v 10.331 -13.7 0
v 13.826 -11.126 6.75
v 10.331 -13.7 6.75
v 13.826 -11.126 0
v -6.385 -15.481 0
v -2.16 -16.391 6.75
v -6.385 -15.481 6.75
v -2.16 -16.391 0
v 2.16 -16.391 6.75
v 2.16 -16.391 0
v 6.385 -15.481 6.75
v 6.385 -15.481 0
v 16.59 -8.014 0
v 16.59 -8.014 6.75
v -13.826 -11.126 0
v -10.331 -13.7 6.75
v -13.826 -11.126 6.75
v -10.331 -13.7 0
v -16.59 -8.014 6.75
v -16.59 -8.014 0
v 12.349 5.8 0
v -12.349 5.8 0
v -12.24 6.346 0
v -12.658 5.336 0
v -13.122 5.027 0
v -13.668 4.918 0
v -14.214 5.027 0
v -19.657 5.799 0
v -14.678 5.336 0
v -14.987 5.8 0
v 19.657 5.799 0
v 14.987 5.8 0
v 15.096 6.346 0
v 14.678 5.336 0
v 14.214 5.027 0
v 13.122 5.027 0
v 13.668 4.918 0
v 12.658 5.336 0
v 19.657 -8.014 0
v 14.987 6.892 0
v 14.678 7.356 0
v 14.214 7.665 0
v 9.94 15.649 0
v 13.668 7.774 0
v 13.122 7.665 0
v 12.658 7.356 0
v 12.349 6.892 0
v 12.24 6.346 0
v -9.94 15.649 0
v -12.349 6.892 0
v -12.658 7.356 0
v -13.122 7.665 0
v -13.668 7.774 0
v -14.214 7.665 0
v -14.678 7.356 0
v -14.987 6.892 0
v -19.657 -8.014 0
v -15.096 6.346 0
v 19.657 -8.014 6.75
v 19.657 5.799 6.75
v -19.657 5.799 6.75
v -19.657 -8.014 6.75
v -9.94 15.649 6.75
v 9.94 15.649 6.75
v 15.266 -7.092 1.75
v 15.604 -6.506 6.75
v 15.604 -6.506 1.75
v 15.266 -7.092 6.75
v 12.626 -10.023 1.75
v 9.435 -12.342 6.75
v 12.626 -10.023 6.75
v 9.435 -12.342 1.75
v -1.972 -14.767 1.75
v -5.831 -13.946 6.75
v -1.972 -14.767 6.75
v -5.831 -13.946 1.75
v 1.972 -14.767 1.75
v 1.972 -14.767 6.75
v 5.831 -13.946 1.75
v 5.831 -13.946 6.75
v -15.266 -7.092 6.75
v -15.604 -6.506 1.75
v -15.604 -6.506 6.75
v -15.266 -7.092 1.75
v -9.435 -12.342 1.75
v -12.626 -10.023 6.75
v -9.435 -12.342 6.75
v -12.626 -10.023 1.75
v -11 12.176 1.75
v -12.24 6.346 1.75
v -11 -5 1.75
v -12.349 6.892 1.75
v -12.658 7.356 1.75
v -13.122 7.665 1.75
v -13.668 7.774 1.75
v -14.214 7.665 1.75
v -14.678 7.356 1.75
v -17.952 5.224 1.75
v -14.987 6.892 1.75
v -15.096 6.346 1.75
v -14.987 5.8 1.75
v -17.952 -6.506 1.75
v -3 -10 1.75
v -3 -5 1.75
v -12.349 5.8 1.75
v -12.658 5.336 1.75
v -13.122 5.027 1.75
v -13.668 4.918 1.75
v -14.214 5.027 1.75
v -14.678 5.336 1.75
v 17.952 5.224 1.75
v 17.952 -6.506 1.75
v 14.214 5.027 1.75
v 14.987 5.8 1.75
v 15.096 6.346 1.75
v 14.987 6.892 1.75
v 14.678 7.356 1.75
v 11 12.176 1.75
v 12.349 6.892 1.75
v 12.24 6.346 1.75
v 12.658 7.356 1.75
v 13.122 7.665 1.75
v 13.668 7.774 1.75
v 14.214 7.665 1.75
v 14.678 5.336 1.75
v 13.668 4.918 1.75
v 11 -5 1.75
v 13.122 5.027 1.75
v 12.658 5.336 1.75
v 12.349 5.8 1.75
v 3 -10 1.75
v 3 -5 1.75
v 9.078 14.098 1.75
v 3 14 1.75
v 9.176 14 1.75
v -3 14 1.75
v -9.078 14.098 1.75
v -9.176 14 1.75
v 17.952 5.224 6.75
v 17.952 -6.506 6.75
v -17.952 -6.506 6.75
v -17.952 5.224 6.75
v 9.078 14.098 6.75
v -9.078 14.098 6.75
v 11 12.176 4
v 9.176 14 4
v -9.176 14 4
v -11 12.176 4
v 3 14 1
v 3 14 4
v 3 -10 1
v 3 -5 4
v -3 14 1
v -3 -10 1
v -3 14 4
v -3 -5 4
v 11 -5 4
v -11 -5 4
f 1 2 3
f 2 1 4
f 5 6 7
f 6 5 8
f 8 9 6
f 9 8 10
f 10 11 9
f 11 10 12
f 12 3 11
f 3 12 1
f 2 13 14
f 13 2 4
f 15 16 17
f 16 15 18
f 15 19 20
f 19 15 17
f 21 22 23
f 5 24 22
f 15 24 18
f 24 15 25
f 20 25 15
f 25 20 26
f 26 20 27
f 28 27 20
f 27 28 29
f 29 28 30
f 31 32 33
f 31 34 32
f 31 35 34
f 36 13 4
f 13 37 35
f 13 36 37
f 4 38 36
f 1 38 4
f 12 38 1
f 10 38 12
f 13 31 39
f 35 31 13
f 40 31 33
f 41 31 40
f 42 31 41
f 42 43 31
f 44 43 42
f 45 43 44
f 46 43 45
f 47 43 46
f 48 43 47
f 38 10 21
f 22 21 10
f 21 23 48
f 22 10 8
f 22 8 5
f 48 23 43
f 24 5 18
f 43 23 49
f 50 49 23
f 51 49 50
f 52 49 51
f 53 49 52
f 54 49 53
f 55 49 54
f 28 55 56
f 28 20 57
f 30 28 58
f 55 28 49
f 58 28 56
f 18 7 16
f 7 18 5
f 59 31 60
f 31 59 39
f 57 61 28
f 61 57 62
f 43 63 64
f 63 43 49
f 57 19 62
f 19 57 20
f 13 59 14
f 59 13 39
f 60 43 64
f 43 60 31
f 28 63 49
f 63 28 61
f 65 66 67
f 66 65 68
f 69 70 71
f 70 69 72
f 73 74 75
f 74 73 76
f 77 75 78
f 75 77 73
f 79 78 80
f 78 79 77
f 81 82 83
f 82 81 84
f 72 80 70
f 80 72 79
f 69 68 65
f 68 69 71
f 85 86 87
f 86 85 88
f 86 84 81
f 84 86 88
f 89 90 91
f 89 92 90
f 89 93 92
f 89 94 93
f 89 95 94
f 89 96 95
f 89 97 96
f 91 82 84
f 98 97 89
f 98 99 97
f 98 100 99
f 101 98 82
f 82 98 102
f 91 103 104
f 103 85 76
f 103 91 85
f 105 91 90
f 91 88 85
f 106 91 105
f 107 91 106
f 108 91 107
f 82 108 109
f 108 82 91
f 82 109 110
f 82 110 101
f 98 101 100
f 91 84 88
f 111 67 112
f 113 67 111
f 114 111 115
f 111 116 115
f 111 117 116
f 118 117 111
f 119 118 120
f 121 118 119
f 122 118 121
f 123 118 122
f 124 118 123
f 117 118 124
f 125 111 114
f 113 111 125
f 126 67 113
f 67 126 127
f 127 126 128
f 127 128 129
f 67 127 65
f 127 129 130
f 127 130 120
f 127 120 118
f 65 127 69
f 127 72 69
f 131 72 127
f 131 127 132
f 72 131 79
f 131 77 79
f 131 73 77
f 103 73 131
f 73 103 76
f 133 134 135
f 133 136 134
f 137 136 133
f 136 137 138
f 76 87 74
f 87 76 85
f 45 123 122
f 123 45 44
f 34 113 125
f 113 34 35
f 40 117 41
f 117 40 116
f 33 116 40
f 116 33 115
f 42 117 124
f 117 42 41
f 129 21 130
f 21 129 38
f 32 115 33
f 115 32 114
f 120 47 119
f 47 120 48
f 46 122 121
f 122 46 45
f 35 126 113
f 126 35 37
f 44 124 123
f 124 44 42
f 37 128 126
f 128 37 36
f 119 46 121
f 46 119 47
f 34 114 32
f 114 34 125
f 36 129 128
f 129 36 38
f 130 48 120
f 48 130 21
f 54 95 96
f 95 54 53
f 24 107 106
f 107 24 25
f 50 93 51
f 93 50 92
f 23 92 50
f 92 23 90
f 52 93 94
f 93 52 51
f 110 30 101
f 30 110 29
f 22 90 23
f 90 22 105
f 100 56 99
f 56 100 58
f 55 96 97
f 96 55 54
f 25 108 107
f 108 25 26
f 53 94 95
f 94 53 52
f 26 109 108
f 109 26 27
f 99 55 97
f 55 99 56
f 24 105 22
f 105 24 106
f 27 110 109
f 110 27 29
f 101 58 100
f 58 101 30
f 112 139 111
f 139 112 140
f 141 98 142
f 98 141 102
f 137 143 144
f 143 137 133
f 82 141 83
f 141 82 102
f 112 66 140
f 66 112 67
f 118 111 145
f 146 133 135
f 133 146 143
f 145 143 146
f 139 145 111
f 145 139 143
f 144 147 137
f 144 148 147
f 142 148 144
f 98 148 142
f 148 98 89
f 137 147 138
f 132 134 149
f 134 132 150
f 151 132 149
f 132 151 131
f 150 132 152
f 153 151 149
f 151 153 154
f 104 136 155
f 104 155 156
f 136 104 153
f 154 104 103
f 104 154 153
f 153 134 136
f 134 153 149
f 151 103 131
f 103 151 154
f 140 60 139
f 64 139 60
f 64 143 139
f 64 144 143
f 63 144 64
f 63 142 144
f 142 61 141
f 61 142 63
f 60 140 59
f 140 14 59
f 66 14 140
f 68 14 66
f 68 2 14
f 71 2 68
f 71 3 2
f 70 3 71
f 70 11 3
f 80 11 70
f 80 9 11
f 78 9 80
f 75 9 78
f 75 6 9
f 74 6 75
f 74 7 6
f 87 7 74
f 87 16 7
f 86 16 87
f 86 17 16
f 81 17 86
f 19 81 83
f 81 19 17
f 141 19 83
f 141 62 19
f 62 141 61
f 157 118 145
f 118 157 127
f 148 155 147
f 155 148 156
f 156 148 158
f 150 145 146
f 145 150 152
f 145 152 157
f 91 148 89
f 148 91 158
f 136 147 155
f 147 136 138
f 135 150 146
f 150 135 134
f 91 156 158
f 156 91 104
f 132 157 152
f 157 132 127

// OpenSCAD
module end(holes = true)
{
    scale([1.02, 1.02, 1])
    difference()
    {
        union()
        {
            translate([0,-0.2,5])
                cube([35.2, 20.2, 10], center = true);
            if(holes)
            {
                translate([(35-(2*4.1))/2, 2.3, -10])
                    cylinder(r=2.8/2, h=30, $fn=16);
                translate([-(35-(2*4.1))/2, 2.3, -10])
                    cylinder(r=2.8/2, h=30, $fn=16);
            }
            else
            {
                translate([-35.2/2, -11, 0])
                    cube([35.2, 1, 10]);
            }
            //translate([-10, -10-10, 0])
            //    cube([20, 0.01, 10]);
            
            difference()
            {
                translate([0, 0, 0])
                    cylinder(r=18.5, h=10);
                translate([-20, -10, 0])
                    cube([40, 50, 10]);
            }
        }
        
        translate([16/2+.8, 10, 0])
            rotate(a=-45, v=[0, 0, 1])
                cube([20, 10, 10]);
        mirror([1,0,0])
        {
            translate([16/2+.8, 10, 0])
                rotate(a=-45, v=[0, 0, 1])
                    cube([20, 10, 10]);

        }
    }
}

module cap(esp=true)
{
    difference()
    {
        scale([1.095, 1.11, 1])
            translate([0,4,0])
                end(false);

        if(esp)
        {
            translate([0,4,0.75])
                end();
            translate([-18.5/2, 0,0.75])
                cube([18.5, 20, 2]);
        }
        else
        {
            translate([0,4,0.75 + 4-3])
                end();
            translate([-3,-10,1])
                cube([6, 24, 10]);
        }
        
        translate([-30, -30, 2.75+4])
            cube([60, 60, 30]);
    }
    
    if(esp == false)
    {
        difference()
        {
            translate([-11,-5,0])
                cube([22,19,4]);
            translate([-3,-10,1])
                cube([6, 24, 10]);

        }
    }
}

//2D for pcb
module proj()
{
    projection()
    difference()
    {
        end();
        translate([(35-(2*4.1))/2, 2.3, -10])
            cylinder(r=2.8/2, h=30, $fn=16);
        translate([-(35-(2*4.1))/2, 2.3, -10])
            cylinder(r=2.8/2, h=30, $fn=16);
    }
}

//3D
//cap(true);
cap(false);
